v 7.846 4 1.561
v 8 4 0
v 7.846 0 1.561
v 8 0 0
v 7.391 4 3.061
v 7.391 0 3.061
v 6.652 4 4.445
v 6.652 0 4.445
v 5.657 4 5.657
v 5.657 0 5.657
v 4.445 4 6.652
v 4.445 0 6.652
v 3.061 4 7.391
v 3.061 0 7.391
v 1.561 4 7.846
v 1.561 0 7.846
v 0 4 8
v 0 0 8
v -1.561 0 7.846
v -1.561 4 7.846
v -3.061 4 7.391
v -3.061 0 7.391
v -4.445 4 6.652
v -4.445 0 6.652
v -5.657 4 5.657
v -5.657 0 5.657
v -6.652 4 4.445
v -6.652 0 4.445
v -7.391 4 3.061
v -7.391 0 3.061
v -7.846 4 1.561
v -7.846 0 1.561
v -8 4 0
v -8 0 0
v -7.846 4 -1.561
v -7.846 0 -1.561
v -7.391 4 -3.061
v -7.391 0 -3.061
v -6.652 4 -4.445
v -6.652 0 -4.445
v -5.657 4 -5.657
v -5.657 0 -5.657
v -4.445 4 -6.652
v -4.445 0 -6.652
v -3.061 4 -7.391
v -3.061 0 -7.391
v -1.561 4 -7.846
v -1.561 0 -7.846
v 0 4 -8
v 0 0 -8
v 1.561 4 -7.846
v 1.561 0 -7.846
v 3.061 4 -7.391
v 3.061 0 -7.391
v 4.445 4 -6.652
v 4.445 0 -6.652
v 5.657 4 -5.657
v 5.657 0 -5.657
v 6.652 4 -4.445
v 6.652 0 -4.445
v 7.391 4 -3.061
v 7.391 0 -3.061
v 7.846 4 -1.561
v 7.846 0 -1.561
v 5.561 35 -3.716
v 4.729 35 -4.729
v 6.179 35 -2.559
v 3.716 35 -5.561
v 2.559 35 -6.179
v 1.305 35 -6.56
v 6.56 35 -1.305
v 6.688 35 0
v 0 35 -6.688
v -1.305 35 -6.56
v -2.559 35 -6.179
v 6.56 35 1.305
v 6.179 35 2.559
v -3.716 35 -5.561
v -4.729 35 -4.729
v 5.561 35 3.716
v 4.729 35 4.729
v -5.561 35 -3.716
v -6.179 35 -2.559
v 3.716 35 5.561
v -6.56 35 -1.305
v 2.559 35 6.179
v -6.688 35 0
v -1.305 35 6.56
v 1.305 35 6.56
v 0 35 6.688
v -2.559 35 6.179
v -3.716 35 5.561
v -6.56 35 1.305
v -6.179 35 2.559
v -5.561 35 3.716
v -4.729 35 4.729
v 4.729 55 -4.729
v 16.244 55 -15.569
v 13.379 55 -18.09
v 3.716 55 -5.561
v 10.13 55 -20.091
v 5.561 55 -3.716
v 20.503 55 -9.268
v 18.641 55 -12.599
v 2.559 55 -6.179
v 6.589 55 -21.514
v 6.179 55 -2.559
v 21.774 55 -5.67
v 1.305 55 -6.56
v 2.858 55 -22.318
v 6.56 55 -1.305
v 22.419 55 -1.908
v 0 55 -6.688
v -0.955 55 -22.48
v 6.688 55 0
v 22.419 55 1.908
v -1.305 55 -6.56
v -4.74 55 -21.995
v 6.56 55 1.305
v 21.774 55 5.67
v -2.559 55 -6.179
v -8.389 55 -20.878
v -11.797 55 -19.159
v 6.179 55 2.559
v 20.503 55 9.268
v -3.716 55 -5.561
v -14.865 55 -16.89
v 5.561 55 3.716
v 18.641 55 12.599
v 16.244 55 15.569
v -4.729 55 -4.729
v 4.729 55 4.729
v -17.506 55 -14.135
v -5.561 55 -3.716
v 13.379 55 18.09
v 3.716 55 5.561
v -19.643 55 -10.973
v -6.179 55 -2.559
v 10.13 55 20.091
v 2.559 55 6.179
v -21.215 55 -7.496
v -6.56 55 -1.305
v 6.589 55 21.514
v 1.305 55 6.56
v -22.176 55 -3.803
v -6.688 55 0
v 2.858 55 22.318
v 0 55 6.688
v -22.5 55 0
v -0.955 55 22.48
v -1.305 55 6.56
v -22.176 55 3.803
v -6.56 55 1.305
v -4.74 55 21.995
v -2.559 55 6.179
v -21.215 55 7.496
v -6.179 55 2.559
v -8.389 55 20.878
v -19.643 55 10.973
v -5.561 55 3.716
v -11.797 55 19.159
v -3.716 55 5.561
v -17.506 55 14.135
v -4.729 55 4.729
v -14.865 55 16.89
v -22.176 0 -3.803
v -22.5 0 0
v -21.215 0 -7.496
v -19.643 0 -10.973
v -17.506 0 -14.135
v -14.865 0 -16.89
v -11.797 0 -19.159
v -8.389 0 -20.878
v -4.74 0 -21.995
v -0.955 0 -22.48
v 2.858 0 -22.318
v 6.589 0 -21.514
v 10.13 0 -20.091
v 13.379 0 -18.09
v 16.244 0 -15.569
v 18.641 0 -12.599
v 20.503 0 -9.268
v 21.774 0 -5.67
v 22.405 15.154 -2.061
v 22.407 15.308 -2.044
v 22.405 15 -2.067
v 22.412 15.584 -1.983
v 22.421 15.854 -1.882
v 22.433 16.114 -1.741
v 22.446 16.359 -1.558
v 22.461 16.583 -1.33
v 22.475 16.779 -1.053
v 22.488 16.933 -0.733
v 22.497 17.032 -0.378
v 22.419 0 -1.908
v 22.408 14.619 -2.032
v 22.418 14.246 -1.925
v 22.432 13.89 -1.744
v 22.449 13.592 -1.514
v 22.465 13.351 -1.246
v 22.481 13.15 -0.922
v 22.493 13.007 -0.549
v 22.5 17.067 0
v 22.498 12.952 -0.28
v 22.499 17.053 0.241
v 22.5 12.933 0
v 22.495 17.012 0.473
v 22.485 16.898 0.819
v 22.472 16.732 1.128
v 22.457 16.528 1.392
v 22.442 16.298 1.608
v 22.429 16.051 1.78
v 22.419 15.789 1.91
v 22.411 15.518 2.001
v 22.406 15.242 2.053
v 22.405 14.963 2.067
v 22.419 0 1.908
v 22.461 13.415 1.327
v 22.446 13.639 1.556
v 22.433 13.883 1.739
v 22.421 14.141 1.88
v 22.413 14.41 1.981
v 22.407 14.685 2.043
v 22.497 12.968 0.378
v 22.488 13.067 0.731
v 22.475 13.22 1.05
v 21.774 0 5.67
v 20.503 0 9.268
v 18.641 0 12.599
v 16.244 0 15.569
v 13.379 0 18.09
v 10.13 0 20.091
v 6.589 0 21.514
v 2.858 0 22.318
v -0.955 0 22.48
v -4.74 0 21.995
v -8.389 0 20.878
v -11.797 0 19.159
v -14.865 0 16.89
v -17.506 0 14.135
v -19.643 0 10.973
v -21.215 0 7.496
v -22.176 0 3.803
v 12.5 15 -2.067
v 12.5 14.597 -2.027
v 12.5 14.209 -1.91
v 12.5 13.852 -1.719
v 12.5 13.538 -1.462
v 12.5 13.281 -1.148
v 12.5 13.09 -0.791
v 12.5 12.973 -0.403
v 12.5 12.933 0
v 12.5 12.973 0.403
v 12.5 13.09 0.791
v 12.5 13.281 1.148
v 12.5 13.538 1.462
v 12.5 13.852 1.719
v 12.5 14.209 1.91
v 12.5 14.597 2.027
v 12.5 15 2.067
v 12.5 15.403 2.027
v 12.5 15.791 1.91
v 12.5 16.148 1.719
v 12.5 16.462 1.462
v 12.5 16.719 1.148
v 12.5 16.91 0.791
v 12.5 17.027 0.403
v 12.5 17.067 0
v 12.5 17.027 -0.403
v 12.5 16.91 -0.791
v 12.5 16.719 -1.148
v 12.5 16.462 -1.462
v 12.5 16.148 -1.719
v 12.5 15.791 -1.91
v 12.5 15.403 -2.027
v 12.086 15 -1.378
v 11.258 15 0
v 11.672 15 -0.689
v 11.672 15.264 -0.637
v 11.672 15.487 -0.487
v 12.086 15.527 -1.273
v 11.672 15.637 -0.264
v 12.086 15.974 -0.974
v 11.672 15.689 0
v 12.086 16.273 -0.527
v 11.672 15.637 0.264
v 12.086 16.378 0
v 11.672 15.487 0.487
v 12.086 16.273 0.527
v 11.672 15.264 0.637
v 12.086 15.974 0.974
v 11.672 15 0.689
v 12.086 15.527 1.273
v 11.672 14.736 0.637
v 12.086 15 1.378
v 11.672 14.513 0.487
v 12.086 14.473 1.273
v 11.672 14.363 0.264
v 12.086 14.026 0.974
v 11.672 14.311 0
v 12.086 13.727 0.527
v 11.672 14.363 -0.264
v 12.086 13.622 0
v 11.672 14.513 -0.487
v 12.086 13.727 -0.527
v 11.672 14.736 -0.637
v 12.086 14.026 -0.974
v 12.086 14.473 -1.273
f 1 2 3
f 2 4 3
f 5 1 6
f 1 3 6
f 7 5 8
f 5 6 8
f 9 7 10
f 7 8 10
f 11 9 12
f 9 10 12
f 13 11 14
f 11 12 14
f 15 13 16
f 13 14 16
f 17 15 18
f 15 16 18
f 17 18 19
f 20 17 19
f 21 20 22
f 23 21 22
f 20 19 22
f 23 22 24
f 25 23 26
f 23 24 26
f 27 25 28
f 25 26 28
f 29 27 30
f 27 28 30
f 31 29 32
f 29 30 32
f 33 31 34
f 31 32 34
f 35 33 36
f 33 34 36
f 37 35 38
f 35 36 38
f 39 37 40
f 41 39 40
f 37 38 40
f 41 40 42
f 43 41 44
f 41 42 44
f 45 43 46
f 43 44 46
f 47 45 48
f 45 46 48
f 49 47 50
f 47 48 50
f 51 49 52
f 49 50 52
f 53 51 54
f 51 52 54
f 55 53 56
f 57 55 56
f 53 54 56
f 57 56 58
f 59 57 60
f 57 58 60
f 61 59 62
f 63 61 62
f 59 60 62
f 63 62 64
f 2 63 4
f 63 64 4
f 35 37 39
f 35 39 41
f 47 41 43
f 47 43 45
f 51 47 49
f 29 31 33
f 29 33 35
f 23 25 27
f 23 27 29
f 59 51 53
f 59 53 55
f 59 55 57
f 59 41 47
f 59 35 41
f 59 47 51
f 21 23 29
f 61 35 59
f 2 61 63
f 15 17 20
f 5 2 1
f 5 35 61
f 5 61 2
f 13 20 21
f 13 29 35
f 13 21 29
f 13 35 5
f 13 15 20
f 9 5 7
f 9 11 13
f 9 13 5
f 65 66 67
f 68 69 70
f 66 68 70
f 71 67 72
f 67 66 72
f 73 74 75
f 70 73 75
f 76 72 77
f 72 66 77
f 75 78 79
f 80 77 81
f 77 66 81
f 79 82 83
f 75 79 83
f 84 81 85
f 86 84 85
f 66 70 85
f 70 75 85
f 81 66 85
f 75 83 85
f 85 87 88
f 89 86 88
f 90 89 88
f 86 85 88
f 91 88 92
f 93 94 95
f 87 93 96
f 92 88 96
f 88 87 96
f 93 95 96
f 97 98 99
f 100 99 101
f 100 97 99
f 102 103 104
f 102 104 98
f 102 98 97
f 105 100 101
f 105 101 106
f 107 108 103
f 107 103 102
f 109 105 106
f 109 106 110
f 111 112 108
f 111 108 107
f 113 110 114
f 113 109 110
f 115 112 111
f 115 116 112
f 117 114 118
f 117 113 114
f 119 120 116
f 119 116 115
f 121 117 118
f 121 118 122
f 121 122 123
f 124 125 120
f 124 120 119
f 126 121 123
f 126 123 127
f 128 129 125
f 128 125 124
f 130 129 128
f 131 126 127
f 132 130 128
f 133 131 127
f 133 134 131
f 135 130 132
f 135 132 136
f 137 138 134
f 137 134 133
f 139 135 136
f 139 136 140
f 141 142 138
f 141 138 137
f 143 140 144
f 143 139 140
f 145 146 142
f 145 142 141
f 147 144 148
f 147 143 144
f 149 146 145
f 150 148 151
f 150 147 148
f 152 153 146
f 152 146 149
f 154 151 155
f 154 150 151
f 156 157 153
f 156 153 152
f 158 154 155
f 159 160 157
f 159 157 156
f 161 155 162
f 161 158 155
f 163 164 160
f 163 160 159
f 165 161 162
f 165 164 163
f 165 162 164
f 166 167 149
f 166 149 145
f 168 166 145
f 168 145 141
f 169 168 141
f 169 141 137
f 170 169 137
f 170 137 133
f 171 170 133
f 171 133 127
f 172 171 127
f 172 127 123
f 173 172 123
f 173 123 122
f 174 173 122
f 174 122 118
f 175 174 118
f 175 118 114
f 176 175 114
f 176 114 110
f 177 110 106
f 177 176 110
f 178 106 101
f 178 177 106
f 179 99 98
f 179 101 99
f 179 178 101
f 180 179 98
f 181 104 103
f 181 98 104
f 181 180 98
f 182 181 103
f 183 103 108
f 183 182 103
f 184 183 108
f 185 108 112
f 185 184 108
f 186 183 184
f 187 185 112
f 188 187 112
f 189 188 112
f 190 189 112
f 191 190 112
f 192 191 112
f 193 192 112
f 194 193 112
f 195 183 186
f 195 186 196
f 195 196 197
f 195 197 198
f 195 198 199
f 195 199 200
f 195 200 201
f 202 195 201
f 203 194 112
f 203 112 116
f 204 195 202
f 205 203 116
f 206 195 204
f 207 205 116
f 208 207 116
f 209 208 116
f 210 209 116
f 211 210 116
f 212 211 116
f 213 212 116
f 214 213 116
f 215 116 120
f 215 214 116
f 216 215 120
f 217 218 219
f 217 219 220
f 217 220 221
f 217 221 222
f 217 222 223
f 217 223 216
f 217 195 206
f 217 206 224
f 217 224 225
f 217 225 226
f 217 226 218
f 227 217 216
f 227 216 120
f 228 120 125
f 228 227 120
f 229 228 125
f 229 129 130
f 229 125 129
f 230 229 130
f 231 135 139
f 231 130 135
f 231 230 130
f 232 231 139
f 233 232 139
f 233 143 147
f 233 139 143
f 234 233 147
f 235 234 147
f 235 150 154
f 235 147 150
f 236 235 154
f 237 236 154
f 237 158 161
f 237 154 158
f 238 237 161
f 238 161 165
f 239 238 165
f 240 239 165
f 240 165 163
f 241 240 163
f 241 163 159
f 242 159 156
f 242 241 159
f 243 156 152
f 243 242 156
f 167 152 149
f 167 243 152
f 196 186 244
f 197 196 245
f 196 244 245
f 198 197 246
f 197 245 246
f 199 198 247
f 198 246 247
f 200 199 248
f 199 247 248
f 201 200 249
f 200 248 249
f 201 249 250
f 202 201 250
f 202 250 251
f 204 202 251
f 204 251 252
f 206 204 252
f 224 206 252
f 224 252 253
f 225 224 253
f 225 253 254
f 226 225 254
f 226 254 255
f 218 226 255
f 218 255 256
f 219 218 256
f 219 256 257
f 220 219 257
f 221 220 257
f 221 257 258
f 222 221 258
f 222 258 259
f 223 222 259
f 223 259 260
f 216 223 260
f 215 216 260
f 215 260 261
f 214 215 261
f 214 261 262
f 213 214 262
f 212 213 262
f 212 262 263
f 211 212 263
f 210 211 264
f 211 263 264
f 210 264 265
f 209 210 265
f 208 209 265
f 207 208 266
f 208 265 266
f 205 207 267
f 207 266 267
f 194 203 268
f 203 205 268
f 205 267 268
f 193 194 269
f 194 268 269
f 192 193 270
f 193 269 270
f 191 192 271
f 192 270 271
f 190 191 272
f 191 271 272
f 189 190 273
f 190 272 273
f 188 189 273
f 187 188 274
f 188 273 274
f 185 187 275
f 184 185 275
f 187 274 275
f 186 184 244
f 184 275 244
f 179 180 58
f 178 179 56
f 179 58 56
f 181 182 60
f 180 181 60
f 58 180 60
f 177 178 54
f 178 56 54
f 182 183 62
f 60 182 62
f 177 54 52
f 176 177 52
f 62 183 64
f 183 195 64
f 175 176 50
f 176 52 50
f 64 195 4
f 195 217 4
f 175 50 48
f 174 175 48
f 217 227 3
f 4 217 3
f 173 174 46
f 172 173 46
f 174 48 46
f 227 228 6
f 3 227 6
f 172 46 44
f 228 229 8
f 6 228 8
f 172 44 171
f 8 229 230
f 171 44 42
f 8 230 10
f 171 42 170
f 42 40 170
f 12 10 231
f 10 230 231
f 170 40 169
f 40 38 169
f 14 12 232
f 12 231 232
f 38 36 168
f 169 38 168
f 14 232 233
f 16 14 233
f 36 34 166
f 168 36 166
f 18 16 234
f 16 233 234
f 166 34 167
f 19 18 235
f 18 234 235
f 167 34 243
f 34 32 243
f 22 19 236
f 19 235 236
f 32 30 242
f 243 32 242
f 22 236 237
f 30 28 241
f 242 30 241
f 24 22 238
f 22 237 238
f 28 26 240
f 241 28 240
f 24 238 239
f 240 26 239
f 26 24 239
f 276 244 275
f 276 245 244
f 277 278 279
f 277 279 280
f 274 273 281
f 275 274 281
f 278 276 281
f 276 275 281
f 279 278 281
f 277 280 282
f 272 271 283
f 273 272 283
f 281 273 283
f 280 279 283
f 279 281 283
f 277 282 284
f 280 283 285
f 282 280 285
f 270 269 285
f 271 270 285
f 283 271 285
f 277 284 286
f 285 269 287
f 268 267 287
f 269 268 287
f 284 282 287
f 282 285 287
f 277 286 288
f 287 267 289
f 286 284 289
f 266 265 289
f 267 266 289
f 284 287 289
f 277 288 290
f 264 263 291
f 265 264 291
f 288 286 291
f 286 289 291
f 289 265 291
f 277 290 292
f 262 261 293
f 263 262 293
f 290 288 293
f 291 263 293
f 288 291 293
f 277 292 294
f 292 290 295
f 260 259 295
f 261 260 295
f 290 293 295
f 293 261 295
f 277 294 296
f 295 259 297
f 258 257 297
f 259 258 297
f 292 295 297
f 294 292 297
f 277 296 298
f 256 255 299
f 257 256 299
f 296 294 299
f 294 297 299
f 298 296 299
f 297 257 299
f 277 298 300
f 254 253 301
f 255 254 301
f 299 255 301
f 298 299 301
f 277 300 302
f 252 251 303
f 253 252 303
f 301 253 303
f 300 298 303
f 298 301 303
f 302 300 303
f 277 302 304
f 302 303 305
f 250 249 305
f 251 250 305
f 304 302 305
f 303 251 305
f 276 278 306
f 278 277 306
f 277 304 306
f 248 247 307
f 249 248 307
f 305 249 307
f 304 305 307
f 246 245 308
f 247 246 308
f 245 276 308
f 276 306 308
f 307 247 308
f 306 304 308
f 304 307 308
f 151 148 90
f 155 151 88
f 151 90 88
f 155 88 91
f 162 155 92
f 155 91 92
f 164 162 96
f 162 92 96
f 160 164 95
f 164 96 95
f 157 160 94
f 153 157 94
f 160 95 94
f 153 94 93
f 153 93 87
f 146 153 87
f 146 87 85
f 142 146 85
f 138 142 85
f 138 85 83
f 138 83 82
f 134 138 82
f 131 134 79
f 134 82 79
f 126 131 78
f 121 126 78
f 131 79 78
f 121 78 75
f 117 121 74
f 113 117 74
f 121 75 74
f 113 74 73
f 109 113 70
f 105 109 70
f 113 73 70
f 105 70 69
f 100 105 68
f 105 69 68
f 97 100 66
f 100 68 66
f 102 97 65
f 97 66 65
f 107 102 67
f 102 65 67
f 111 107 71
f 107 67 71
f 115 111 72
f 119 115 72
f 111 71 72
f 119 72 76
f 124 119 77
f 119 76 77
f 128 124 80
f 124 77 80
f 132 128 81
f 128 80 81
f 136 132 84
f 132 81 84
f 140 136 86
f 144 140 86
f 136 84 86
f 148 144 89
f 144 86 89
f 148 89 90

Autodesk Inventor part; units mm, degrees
ref_plane "YZ Plane" through (0, 0, 0) normal (1, 0, 0) x (0, 1, 0)
ref_plane "XZ Plane" through (0, 0, 0) normal (0, 1, 0) x (-1, 0, 0)
sketch "Эскиз1" plane through (0, 0, 0) normal (0, 1, 0) x (-1, 0, 0)
  circle A0 centre (0, 0) radius 22.5
  dimension "d0" = 45
extrude "Выдавливание1" add sketch "Эскиз1" along normal blind 55
sketch "Эскиз2" plane through (0, 0, 0) normal (0, -1, 0) x (1, 0, 0)
  circle A0 centre (0, 0) radius 22.5 projected
  point P0 (22.5, 0)
ref_plane "РабПлоскость1" through (22.5, 0, 0) normal (1, 0, 0) x (0, 1, 0)
sketch "Эскиз3" plane through (22.5, 0, 0) normal (1, 0, 0) x (0, 1, 0)
  line L0 (0, 0) -> (12.5, 0)
  line L1 (12.5, 0) -> (17.5, 0)
  circle A0 centre (15, 0) radius 2.5
  dimension "d3" = 12.5
  dimension "d4" = 5
hole "Отверстие1" at (22.5, 15, 0) direction (-1, 0, 0) diameter 4.134 depth 10 tip angle 118 thread size "M5x0.8" class "6H" standard "ISO Metric profile"
sketch "Эскиз4" plane through (0, 55, 0) normal (0, 1, 0) x (1, 0, 0)
  point P0 (0, 0)
  point P1 (0, 0)
hole "Отверстие2" at (0, 55, 0) direction (0, -1, 0) diameter 13.3762 depth 20 thread size "M15x1.5" class "6H" standard "ISO Metric profile"
sketch "Эскиз5" plane through (0, 0, 0) normal (0, -1, 0) x (1, 0, 0)
  circle A0 centre (0, 0) radius 8
  dimension "d27" = 16
extrude "Выдавливание2" cut sketch "Эскиз5" against normal blind 4
properties part number "17701729.304517.015"
